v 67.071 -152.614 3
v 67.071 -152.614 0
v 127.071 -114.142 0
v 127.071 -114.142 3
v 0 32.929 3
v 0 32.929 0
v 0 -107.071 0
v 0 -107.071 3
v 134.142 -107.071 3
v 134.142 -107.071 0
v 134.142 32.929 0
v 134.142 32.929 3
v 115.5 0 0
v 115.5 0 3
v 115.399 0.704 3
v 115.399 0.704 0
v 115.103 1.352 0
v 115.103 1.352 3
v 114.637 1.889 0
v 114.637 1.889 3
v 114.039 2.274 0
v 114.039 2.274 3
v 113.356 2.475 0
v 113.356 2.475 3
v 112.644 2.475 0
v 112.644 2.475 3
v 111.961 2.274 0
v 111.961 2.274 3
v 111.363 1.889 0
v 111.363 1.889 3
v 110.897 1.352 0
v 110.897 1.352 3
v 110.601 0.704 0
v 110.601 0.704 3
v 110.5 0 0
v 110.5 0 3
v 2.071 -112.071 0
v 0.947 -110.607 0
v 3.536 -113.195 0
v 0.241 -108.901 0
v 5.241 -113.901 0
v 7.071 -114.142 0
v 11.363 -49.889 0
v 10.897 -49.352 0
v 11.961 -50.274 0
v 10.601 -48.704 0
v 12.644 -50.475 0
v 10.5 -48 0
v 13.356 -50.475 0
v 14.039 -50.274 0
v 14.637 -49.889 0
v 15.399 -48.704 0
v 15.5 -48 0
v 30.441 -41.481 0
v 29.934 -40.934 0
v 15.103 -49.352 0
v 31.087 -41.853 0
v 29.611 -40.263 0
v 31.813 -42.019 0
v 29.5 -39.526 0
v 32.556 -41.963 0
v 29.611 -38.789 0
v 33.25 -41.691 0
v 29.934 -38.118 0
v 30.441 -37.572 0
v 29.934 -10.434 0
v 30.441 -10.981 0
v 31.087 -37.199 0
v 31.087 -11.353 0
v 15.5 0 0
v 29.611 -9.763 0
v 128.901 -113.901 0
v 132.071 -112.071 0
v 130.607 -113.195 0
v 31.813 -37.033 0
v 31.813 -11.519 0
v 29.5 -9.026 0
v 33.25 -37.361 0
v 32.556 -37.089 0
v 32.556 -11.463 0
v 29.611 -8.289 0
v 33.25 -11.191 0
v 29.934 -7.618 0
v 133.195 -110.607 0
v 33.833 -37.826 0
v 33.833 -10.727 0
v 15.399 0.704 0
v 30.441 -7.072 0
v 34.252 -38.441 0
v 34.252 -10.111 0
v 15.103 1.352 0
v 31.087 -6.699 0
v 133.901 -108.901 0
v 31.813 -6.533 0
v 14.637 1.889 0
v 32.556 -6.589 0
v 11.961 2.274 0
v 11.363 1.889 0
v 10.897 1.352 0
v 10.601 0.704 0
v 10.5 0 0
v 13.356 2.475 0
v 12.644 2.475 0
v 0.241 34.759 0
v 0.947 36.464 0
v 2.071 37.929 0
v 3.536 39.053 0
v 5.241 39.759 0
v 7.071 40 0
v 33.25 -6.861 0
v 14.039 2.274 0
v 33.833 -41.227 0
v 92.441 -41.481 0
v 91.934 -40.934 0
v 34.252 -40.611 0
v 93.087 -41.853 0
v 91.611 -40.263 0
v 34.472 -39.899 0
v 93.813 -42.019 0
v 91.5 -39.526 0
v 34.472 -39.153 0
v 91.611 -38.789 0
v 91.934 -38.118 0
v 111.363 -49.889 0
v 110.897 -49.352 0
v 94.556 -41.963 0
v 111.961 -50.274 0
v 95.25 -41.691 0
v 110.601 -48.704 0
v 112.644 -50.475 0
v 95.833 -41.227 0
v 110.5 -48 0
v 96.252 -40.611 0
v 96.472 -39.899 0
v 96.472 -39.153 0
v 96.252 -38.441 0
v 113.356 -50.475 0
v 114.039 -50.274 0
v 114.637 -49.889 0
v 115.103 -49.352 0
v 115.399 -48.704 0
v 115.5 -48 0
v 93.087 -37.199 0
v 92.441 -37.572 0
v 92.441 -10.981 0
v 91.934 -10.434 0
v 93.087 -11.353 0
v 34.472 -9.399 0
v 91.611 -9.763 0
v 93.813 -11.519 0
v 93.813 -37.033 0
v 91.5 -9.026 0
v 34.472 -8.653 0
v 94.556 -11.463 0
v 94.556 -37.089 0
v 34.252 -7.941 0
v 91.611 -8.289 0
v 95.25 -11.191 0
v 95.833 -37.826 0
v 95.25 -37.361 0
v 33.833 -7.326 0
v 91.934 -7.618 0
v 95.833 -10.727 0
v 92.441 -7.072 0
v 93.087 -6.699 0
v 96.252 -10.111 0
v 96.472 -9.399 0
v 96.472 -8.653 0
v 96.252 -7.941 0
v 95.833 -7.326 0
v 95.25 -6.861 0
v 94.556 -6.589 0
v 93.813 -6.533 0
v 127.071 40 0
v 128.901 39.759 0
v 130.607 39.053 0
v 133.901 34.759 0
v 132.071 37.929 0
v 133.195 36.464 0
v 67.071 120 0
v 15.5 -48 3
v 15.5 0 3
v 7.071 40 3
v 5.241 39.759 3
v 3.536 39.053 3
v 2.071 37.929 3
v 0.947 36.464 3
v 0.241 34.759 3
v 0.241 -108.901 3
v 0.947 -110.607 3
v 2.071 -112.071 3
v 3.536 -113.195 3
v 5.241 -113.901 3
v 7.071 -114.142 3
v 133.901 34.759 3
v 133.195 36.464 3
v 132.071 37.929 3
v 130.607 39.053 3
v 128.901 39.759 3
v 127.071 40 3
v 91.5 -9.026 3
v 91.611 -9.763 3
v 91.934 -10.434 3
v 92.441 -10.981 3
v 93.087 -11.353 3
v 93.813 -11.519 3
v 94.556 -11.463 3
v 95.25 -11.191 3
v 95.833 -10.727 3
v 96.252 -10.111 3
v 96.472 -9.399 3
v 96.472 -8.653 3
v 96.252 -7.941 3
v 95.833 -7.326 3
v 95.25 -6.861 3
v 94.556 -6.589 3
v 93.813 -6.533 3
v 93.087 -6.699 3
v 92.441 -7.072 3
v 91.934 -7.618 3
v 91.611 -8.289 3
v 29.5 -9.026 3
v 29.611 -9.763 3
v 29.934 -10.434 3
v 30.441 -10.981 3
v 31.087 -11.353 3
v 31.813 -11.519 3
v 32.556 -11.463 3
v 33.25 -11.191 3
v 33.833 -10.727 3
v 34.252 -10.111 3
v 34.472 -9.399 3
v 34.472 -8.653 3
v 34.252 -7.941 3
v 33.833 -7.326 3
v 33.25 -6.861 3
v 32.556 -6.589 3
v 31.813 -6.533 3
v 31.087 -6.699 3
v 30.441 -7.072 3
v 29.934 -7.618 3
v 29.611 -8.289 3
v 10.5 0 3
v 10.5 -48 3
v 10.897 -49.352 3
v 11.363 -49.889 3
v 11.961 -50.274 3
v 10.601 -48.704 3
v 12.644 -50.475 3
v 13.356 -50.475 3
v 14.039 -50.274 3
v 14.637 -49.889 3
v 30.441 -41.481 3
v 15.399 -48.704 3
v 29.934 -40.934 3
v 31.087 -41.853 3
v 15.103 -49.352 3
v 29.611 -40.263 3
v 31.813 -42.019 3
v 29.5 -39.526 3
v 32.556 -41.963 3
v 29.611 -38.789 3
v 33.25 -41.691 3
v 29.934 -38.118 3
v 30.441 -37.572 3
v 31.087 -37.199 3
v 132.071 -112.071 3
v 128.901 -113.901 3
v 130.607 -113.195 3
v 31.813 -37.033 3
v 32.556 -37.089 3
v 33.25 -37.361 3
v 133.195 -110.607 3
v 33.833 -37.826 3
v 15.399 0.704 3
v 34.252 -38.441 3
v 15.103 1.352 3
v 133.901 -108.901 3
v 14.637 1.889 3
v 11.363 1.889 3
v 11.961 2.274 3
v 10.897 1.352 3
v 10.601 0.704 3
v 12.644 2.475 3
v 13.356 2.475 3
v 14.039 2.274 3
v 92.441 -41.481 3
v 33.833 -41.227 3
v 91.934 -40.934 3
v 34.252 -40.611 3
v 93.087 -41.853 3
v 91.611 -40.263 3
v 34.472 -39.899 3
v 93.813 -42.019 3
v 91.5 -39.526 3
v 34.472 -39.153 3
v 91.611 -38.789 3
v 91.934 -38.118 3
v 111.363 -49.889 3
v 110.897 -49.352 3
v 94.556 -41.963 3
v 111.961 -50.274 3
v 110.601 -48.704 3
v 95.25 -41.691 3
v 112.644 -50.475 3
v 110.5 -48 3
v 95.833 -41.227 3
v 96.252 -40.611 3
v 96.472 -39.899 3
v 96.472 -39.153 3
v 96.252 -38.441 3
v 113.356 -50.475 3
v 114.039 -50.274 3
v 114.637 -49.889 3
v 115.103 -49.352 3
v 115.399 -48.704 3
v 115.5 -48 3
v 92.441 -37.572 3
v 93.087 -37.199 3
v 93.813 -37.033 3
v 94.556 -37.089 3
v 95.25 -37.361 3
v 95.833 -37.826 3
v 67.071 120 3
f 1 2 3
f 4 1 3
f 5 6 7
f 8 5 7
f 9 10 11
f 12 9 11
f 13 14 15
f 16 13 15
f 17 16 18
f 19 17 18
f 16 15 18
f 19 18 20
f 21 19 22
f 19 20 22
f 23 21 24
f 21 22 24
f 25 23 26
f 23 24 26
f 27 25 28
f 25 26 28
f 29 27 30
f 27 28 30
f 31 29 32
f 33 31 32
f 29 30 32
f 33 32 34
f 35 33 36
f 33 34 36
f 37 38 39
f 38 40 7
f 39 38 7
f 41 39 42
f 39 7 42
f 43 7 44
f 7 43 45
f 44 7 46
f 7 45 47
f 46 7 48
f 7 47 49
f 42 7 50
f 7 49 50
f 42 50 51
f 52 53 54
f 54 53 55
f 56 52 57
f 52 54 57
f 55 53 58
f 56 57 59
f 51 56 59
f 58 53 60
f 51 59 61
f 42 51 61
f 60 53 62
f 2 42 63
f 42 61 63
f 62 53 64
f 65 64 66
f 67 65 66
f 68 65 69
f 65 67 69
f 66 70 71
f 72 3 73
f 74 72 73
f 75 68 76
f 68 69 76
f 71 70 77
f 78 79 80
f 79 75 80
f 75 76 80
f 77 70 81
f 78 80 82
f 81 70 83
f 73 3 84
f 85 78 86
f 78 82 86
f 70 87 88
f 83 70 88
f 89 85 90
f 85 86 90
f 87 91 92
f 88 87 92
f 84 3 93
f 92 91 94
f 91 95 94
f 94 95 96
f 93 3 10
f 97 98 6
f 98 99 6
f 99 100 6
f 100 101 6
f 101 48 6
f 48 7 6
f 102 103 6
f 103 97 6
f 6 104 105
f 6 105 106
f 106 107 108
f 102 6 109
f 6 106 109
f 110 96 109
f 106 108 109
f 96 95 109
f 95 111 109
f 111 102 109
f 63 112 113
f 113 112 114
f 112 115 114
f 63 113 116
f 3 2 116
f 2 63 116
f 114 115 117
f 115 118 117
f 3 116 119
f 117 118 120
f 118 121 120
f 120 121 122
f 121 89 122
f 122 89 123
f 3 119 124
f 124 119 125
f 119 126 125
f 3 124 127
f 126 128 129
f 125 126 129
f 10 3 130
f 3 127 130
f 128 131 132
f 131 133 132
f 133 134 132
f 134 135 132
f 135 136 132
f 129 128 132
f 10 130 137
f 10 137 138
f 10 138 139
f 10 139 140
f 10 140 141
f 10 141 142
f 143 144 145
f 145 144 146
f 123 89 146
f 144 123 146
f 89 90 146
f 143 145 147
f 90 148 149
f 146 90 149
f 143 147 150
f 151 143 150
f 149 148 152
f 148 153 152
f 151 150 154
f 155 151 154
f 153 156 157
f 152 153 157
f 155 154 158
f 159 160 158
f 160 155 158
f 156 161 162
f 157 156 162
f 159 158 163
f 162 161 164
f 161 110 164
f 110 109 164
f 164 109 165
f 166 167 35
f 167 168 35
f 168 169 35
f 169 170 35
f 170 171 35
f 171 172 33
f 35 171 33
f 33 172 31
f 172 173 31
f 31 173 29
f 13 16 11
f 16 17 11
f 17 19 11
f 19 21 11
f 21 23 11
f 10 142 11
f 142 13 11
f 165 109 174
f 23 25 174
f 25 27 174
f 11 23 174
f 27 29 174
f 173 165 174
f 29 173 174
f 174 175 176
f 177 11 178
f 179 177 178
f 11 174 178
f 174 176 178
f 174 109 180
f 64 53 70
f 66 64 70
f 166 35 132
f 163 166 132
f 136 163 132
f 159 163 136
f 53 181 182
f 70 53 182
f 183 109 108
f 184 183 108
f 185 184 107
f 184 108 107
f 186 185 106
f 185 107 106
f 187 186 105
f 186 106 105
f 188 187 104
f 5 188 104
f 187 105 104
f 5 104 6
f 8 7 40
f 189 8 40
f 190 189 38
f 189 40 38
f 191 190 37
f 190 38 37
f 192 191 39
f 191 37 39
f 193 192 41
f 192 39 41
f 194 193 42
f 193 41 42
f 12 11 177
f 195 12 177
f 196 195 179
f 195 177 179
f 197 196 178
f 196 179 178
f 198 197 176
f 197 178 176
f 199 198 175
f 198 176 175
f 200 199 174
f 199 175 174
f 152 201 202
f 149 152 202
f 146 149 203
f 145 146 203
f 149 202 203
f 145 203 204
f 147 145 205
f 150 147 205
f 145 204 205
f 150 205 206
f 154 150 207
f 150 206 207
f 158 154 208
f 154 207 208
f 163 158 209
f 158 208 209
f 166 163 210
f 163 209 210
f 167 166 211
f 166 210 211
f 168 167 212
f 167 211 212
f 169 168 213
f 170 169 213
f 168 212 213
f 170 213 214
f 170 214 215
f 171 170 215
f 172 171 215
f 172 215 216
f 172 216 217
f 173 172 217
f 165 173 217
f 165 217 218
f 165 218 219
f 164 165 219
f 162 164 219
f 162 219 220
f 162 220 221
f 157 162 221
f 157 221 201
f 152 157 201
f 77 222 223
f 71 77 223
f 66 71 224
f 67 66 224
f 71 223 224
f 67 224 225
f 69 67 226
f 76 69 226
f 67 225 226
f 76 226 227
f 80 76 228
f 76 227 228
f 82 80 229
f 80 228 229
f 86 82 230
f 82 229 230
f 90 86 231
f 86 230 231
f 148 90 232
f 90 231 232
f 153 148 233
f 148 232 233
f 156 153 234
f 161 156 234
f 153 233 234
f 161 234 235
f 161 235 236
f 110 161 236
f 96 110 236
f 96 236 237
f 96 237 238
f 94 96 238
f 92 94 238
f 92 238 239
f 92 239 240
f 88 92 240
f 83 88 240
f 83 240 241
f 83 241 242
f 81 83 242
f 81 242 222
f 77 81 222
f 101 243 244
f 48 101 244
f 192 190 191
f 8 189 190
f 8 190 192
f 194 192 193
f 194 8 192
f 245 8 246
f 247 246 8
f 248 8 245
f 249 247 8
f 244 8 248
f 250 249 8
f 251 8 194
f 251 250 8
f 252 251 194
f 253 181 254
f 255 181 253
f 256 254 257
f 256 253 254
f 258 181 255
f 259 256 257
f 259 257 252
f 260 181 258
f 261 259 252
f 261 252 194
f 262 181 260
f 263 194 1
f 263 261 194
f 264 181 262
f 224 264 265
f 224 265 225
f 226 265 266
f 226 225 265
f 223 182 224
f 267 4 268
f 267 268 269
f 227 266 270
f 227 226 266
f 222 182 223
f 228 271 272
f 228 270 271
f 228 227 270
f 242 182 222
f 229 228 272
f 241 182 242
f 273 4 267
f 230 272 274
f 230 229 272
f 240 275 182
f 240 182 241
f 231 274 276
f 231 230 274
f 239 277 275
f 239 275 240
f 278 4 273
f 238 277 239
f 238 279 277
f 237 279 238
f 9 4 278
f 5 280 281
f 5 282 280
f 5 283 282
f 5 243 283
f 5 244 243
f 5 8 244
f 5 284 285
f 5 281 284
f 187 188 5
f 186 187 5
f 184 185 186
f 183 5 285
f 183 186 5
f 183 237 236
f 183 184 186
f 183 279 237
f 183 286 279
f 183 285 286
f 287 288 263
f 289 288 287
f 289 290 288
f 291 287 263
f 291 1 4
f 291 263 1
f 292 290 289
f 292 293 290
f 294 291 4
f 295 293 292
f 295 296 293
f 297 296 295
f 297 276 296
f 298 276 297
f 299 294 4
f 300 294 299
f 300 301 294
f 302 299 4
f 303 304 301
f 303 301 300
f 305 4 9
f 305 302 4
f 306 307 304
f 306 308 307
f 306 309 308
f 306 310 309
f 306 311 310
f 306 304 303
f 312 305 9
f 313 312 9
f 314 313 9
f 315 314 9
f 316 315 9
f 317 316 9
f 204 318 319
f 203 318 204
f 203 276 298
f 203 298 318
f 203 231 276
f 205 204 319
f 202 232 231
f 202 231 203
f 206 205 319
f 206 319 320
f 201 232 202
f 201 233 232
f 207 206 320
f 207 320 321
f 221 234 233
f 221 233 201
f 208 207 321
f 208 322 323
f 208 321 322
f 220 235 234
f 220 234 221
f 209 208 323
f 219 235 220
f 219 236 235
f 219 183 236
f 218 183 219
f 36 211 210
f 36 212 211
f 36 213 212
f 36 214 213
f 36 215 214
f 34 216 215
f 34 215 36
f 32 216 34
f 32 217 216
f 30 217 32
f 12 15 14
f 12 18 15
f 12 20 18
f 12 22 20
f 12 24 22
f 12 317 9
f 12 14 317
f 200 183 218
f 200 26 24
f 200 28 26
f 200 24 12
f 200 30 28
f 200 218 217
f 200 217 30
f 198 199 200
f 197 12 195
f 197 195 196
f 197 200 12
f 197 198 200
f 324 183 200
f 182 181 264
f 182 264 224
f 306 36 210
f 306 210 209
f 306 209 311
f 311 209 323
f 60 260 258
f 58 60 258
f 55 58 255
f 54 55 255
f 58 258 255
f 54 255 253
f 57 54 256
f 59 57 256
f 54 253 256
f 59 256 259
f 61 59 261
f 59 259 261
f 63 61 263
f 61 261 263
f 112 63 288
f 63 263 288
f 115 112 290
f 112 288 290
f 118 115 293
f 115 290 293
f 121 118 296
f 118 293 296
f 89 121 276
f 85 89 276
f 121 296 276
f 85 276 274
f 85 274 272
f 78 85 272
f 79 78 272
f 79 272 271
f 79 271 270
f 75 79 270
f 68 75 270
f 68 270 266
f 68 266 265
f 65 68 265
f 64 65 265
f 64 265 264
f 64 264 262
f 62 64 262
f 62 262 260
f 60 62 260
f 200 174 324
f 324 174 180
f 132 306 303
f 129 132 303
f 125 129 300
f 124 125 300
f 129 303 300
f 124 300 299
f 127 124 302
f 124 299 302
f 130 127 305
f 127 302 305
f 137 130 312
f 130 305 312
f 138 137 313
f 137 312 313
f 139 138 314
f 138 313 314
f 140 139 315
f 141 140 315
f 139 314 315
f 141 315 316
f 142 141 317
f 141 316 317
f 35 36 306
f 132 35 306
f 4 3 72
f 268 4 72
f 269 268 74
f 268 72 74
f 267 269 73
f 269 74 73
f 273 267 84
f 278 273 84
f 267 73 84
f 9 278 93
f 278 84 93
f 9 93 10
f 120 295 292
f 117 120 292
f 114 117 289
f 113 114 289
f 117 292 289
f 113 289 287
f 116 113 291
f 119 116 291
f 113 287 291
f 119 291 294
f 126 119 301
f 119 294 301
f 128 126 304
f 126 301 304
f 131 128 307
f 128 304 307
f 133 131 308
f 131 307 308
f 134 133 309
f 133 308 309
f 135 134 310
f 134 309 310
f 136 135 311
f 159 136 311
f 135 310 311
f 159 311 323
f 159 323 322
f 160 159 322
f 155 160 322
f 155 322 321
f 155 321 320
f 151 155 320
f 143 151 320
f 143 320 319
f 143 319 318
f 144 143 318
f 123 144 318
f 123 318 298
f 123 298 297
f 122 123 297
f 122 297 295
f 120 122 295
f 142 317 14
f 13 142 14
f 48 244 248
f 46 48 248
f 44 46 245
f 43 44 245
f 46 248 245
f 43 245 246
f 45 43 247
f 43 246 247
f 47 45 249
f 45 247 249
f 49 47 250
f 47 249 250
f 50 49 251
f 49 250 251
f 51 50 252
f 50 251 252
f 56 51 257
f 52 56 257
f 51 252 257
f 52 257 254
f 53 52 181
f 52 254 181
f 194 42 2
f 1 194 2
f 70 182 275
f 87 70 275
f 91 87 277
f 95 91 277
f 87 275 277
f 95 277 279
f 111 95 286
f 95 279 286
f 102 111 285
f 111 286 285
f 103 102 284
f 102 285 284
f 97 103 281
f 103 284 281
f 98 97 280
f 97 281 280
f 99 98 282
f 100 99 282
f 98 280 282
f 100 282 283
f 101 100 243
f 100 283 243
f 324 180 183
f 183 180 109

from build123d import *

# Parameters (mm, degrees)
F1_DEPTH = 3
F2_D     = 5
F3_D     = 5
F5_DEPTH = 25
F6_DEPTH = 25
F7_DEPTH = 3


with BuildPart() as f1:
    # F0 (on Top) → F1 (new body)
    with BuildSketch(Plane.XY):
        with BuildLine():
            ThreePointArc((7.0710678119, 40), (2.0710678119, 37.9289321881), (0, 32.9289321881))
            Line((0, 32.9289321881), (0, 0))
            Line((0, 0), (0, -107.0710678119))
            ThreePointArc((0, -107.0710678119), (2.0710678119, -112.0710678119), (7.0710678119, -114.1421356237))
            Line((7.0710678119, -114.1421356237), (127.0710678119, -114.1421356237))
            ThreePointArc((127.0710678119, -114.1421356237), (132.0710678119, -112.0710678119), (134.1421356237, -107.0710678119))
            Line((134.1421356237, -107.0710678119), (134.1421356237, 0))
            Line((134.1421356237, 0), (134.1421356237, 32.9289321881))
            ThreePointArc((134.1421356237, 32.9289321881), (132.0710678119, 37.9289321881), (127.0710678119, 40))
            Line((127.0710678119, 40), (7.0710678119, 40))
        make_face()
    extrude(amount=F1_DEPTH)

    # F2 (through all)
    with Locations(Plane(origin=(0, 0, 0), x_dir=(1, 0, 0), z_dir=(0, 0, -1))):
        with Locations((94, 9.0260861005), (32, 9.0260861005)):
            Hole(F2_D / 2)

    # F3 (through all)
    with Locations(Plane(origin=(0, 0, 0), x_dir=(1, 0, 0), z_dir=(0, 0, -1))):
        with Locations((32, 39.5260861005), (94, 39.5260861005)):
            Hole(F3_D / 2)

    # F4 (on face) → F5 (cut)
    with BuildSketch(Plane.XY.offset(3)):
        with BuildLine():
            ThreePointArc((115.5, 0), (113, 2.5), (110.5, 0))
            Line((110.5, 0), (110.5, -48))
            ThreePointArc((110.5, -48), (113, -50.5), (115.5, -48))
            Line((115.5, -48), (115.5, 0))
        make_face()
    extrude(amount=-F5_DEPTH, mode=Mode.SUBTRACT)

    # F4 (on face) → F6 (cut)
    with BuildSketch(Plane.XY.offset(3)):
        with BuildLine():
            ThreePointArc((15.5, 0), (13, 2.5), (10.5, 0))
            Line((10.5, 0), (10.5, -48))
            ThreePointArc((10.5, -48), (13, -50.5), (15.5, -48))
            Line((15.5, -48), (15.5, 0))
        make_face()
    extrude(amount=-F6_DEPTH, mode=Mode.SUBTRACT)

    # F0 (on Top) → F7 (join)
    with BuildSketch(Plane.XY):
        Polygon((67.0710678119, 120), (7.0710678119, 40), (127.0710678119, 40), align=None)
        Polygon((127.0710678119, -114.1421356237), (7.0710678119, -114.1421356237), (67.0710678119, -152.6137888432), align=None)
    extrude(amount=F7_DEPTH)


solid = f1.part
